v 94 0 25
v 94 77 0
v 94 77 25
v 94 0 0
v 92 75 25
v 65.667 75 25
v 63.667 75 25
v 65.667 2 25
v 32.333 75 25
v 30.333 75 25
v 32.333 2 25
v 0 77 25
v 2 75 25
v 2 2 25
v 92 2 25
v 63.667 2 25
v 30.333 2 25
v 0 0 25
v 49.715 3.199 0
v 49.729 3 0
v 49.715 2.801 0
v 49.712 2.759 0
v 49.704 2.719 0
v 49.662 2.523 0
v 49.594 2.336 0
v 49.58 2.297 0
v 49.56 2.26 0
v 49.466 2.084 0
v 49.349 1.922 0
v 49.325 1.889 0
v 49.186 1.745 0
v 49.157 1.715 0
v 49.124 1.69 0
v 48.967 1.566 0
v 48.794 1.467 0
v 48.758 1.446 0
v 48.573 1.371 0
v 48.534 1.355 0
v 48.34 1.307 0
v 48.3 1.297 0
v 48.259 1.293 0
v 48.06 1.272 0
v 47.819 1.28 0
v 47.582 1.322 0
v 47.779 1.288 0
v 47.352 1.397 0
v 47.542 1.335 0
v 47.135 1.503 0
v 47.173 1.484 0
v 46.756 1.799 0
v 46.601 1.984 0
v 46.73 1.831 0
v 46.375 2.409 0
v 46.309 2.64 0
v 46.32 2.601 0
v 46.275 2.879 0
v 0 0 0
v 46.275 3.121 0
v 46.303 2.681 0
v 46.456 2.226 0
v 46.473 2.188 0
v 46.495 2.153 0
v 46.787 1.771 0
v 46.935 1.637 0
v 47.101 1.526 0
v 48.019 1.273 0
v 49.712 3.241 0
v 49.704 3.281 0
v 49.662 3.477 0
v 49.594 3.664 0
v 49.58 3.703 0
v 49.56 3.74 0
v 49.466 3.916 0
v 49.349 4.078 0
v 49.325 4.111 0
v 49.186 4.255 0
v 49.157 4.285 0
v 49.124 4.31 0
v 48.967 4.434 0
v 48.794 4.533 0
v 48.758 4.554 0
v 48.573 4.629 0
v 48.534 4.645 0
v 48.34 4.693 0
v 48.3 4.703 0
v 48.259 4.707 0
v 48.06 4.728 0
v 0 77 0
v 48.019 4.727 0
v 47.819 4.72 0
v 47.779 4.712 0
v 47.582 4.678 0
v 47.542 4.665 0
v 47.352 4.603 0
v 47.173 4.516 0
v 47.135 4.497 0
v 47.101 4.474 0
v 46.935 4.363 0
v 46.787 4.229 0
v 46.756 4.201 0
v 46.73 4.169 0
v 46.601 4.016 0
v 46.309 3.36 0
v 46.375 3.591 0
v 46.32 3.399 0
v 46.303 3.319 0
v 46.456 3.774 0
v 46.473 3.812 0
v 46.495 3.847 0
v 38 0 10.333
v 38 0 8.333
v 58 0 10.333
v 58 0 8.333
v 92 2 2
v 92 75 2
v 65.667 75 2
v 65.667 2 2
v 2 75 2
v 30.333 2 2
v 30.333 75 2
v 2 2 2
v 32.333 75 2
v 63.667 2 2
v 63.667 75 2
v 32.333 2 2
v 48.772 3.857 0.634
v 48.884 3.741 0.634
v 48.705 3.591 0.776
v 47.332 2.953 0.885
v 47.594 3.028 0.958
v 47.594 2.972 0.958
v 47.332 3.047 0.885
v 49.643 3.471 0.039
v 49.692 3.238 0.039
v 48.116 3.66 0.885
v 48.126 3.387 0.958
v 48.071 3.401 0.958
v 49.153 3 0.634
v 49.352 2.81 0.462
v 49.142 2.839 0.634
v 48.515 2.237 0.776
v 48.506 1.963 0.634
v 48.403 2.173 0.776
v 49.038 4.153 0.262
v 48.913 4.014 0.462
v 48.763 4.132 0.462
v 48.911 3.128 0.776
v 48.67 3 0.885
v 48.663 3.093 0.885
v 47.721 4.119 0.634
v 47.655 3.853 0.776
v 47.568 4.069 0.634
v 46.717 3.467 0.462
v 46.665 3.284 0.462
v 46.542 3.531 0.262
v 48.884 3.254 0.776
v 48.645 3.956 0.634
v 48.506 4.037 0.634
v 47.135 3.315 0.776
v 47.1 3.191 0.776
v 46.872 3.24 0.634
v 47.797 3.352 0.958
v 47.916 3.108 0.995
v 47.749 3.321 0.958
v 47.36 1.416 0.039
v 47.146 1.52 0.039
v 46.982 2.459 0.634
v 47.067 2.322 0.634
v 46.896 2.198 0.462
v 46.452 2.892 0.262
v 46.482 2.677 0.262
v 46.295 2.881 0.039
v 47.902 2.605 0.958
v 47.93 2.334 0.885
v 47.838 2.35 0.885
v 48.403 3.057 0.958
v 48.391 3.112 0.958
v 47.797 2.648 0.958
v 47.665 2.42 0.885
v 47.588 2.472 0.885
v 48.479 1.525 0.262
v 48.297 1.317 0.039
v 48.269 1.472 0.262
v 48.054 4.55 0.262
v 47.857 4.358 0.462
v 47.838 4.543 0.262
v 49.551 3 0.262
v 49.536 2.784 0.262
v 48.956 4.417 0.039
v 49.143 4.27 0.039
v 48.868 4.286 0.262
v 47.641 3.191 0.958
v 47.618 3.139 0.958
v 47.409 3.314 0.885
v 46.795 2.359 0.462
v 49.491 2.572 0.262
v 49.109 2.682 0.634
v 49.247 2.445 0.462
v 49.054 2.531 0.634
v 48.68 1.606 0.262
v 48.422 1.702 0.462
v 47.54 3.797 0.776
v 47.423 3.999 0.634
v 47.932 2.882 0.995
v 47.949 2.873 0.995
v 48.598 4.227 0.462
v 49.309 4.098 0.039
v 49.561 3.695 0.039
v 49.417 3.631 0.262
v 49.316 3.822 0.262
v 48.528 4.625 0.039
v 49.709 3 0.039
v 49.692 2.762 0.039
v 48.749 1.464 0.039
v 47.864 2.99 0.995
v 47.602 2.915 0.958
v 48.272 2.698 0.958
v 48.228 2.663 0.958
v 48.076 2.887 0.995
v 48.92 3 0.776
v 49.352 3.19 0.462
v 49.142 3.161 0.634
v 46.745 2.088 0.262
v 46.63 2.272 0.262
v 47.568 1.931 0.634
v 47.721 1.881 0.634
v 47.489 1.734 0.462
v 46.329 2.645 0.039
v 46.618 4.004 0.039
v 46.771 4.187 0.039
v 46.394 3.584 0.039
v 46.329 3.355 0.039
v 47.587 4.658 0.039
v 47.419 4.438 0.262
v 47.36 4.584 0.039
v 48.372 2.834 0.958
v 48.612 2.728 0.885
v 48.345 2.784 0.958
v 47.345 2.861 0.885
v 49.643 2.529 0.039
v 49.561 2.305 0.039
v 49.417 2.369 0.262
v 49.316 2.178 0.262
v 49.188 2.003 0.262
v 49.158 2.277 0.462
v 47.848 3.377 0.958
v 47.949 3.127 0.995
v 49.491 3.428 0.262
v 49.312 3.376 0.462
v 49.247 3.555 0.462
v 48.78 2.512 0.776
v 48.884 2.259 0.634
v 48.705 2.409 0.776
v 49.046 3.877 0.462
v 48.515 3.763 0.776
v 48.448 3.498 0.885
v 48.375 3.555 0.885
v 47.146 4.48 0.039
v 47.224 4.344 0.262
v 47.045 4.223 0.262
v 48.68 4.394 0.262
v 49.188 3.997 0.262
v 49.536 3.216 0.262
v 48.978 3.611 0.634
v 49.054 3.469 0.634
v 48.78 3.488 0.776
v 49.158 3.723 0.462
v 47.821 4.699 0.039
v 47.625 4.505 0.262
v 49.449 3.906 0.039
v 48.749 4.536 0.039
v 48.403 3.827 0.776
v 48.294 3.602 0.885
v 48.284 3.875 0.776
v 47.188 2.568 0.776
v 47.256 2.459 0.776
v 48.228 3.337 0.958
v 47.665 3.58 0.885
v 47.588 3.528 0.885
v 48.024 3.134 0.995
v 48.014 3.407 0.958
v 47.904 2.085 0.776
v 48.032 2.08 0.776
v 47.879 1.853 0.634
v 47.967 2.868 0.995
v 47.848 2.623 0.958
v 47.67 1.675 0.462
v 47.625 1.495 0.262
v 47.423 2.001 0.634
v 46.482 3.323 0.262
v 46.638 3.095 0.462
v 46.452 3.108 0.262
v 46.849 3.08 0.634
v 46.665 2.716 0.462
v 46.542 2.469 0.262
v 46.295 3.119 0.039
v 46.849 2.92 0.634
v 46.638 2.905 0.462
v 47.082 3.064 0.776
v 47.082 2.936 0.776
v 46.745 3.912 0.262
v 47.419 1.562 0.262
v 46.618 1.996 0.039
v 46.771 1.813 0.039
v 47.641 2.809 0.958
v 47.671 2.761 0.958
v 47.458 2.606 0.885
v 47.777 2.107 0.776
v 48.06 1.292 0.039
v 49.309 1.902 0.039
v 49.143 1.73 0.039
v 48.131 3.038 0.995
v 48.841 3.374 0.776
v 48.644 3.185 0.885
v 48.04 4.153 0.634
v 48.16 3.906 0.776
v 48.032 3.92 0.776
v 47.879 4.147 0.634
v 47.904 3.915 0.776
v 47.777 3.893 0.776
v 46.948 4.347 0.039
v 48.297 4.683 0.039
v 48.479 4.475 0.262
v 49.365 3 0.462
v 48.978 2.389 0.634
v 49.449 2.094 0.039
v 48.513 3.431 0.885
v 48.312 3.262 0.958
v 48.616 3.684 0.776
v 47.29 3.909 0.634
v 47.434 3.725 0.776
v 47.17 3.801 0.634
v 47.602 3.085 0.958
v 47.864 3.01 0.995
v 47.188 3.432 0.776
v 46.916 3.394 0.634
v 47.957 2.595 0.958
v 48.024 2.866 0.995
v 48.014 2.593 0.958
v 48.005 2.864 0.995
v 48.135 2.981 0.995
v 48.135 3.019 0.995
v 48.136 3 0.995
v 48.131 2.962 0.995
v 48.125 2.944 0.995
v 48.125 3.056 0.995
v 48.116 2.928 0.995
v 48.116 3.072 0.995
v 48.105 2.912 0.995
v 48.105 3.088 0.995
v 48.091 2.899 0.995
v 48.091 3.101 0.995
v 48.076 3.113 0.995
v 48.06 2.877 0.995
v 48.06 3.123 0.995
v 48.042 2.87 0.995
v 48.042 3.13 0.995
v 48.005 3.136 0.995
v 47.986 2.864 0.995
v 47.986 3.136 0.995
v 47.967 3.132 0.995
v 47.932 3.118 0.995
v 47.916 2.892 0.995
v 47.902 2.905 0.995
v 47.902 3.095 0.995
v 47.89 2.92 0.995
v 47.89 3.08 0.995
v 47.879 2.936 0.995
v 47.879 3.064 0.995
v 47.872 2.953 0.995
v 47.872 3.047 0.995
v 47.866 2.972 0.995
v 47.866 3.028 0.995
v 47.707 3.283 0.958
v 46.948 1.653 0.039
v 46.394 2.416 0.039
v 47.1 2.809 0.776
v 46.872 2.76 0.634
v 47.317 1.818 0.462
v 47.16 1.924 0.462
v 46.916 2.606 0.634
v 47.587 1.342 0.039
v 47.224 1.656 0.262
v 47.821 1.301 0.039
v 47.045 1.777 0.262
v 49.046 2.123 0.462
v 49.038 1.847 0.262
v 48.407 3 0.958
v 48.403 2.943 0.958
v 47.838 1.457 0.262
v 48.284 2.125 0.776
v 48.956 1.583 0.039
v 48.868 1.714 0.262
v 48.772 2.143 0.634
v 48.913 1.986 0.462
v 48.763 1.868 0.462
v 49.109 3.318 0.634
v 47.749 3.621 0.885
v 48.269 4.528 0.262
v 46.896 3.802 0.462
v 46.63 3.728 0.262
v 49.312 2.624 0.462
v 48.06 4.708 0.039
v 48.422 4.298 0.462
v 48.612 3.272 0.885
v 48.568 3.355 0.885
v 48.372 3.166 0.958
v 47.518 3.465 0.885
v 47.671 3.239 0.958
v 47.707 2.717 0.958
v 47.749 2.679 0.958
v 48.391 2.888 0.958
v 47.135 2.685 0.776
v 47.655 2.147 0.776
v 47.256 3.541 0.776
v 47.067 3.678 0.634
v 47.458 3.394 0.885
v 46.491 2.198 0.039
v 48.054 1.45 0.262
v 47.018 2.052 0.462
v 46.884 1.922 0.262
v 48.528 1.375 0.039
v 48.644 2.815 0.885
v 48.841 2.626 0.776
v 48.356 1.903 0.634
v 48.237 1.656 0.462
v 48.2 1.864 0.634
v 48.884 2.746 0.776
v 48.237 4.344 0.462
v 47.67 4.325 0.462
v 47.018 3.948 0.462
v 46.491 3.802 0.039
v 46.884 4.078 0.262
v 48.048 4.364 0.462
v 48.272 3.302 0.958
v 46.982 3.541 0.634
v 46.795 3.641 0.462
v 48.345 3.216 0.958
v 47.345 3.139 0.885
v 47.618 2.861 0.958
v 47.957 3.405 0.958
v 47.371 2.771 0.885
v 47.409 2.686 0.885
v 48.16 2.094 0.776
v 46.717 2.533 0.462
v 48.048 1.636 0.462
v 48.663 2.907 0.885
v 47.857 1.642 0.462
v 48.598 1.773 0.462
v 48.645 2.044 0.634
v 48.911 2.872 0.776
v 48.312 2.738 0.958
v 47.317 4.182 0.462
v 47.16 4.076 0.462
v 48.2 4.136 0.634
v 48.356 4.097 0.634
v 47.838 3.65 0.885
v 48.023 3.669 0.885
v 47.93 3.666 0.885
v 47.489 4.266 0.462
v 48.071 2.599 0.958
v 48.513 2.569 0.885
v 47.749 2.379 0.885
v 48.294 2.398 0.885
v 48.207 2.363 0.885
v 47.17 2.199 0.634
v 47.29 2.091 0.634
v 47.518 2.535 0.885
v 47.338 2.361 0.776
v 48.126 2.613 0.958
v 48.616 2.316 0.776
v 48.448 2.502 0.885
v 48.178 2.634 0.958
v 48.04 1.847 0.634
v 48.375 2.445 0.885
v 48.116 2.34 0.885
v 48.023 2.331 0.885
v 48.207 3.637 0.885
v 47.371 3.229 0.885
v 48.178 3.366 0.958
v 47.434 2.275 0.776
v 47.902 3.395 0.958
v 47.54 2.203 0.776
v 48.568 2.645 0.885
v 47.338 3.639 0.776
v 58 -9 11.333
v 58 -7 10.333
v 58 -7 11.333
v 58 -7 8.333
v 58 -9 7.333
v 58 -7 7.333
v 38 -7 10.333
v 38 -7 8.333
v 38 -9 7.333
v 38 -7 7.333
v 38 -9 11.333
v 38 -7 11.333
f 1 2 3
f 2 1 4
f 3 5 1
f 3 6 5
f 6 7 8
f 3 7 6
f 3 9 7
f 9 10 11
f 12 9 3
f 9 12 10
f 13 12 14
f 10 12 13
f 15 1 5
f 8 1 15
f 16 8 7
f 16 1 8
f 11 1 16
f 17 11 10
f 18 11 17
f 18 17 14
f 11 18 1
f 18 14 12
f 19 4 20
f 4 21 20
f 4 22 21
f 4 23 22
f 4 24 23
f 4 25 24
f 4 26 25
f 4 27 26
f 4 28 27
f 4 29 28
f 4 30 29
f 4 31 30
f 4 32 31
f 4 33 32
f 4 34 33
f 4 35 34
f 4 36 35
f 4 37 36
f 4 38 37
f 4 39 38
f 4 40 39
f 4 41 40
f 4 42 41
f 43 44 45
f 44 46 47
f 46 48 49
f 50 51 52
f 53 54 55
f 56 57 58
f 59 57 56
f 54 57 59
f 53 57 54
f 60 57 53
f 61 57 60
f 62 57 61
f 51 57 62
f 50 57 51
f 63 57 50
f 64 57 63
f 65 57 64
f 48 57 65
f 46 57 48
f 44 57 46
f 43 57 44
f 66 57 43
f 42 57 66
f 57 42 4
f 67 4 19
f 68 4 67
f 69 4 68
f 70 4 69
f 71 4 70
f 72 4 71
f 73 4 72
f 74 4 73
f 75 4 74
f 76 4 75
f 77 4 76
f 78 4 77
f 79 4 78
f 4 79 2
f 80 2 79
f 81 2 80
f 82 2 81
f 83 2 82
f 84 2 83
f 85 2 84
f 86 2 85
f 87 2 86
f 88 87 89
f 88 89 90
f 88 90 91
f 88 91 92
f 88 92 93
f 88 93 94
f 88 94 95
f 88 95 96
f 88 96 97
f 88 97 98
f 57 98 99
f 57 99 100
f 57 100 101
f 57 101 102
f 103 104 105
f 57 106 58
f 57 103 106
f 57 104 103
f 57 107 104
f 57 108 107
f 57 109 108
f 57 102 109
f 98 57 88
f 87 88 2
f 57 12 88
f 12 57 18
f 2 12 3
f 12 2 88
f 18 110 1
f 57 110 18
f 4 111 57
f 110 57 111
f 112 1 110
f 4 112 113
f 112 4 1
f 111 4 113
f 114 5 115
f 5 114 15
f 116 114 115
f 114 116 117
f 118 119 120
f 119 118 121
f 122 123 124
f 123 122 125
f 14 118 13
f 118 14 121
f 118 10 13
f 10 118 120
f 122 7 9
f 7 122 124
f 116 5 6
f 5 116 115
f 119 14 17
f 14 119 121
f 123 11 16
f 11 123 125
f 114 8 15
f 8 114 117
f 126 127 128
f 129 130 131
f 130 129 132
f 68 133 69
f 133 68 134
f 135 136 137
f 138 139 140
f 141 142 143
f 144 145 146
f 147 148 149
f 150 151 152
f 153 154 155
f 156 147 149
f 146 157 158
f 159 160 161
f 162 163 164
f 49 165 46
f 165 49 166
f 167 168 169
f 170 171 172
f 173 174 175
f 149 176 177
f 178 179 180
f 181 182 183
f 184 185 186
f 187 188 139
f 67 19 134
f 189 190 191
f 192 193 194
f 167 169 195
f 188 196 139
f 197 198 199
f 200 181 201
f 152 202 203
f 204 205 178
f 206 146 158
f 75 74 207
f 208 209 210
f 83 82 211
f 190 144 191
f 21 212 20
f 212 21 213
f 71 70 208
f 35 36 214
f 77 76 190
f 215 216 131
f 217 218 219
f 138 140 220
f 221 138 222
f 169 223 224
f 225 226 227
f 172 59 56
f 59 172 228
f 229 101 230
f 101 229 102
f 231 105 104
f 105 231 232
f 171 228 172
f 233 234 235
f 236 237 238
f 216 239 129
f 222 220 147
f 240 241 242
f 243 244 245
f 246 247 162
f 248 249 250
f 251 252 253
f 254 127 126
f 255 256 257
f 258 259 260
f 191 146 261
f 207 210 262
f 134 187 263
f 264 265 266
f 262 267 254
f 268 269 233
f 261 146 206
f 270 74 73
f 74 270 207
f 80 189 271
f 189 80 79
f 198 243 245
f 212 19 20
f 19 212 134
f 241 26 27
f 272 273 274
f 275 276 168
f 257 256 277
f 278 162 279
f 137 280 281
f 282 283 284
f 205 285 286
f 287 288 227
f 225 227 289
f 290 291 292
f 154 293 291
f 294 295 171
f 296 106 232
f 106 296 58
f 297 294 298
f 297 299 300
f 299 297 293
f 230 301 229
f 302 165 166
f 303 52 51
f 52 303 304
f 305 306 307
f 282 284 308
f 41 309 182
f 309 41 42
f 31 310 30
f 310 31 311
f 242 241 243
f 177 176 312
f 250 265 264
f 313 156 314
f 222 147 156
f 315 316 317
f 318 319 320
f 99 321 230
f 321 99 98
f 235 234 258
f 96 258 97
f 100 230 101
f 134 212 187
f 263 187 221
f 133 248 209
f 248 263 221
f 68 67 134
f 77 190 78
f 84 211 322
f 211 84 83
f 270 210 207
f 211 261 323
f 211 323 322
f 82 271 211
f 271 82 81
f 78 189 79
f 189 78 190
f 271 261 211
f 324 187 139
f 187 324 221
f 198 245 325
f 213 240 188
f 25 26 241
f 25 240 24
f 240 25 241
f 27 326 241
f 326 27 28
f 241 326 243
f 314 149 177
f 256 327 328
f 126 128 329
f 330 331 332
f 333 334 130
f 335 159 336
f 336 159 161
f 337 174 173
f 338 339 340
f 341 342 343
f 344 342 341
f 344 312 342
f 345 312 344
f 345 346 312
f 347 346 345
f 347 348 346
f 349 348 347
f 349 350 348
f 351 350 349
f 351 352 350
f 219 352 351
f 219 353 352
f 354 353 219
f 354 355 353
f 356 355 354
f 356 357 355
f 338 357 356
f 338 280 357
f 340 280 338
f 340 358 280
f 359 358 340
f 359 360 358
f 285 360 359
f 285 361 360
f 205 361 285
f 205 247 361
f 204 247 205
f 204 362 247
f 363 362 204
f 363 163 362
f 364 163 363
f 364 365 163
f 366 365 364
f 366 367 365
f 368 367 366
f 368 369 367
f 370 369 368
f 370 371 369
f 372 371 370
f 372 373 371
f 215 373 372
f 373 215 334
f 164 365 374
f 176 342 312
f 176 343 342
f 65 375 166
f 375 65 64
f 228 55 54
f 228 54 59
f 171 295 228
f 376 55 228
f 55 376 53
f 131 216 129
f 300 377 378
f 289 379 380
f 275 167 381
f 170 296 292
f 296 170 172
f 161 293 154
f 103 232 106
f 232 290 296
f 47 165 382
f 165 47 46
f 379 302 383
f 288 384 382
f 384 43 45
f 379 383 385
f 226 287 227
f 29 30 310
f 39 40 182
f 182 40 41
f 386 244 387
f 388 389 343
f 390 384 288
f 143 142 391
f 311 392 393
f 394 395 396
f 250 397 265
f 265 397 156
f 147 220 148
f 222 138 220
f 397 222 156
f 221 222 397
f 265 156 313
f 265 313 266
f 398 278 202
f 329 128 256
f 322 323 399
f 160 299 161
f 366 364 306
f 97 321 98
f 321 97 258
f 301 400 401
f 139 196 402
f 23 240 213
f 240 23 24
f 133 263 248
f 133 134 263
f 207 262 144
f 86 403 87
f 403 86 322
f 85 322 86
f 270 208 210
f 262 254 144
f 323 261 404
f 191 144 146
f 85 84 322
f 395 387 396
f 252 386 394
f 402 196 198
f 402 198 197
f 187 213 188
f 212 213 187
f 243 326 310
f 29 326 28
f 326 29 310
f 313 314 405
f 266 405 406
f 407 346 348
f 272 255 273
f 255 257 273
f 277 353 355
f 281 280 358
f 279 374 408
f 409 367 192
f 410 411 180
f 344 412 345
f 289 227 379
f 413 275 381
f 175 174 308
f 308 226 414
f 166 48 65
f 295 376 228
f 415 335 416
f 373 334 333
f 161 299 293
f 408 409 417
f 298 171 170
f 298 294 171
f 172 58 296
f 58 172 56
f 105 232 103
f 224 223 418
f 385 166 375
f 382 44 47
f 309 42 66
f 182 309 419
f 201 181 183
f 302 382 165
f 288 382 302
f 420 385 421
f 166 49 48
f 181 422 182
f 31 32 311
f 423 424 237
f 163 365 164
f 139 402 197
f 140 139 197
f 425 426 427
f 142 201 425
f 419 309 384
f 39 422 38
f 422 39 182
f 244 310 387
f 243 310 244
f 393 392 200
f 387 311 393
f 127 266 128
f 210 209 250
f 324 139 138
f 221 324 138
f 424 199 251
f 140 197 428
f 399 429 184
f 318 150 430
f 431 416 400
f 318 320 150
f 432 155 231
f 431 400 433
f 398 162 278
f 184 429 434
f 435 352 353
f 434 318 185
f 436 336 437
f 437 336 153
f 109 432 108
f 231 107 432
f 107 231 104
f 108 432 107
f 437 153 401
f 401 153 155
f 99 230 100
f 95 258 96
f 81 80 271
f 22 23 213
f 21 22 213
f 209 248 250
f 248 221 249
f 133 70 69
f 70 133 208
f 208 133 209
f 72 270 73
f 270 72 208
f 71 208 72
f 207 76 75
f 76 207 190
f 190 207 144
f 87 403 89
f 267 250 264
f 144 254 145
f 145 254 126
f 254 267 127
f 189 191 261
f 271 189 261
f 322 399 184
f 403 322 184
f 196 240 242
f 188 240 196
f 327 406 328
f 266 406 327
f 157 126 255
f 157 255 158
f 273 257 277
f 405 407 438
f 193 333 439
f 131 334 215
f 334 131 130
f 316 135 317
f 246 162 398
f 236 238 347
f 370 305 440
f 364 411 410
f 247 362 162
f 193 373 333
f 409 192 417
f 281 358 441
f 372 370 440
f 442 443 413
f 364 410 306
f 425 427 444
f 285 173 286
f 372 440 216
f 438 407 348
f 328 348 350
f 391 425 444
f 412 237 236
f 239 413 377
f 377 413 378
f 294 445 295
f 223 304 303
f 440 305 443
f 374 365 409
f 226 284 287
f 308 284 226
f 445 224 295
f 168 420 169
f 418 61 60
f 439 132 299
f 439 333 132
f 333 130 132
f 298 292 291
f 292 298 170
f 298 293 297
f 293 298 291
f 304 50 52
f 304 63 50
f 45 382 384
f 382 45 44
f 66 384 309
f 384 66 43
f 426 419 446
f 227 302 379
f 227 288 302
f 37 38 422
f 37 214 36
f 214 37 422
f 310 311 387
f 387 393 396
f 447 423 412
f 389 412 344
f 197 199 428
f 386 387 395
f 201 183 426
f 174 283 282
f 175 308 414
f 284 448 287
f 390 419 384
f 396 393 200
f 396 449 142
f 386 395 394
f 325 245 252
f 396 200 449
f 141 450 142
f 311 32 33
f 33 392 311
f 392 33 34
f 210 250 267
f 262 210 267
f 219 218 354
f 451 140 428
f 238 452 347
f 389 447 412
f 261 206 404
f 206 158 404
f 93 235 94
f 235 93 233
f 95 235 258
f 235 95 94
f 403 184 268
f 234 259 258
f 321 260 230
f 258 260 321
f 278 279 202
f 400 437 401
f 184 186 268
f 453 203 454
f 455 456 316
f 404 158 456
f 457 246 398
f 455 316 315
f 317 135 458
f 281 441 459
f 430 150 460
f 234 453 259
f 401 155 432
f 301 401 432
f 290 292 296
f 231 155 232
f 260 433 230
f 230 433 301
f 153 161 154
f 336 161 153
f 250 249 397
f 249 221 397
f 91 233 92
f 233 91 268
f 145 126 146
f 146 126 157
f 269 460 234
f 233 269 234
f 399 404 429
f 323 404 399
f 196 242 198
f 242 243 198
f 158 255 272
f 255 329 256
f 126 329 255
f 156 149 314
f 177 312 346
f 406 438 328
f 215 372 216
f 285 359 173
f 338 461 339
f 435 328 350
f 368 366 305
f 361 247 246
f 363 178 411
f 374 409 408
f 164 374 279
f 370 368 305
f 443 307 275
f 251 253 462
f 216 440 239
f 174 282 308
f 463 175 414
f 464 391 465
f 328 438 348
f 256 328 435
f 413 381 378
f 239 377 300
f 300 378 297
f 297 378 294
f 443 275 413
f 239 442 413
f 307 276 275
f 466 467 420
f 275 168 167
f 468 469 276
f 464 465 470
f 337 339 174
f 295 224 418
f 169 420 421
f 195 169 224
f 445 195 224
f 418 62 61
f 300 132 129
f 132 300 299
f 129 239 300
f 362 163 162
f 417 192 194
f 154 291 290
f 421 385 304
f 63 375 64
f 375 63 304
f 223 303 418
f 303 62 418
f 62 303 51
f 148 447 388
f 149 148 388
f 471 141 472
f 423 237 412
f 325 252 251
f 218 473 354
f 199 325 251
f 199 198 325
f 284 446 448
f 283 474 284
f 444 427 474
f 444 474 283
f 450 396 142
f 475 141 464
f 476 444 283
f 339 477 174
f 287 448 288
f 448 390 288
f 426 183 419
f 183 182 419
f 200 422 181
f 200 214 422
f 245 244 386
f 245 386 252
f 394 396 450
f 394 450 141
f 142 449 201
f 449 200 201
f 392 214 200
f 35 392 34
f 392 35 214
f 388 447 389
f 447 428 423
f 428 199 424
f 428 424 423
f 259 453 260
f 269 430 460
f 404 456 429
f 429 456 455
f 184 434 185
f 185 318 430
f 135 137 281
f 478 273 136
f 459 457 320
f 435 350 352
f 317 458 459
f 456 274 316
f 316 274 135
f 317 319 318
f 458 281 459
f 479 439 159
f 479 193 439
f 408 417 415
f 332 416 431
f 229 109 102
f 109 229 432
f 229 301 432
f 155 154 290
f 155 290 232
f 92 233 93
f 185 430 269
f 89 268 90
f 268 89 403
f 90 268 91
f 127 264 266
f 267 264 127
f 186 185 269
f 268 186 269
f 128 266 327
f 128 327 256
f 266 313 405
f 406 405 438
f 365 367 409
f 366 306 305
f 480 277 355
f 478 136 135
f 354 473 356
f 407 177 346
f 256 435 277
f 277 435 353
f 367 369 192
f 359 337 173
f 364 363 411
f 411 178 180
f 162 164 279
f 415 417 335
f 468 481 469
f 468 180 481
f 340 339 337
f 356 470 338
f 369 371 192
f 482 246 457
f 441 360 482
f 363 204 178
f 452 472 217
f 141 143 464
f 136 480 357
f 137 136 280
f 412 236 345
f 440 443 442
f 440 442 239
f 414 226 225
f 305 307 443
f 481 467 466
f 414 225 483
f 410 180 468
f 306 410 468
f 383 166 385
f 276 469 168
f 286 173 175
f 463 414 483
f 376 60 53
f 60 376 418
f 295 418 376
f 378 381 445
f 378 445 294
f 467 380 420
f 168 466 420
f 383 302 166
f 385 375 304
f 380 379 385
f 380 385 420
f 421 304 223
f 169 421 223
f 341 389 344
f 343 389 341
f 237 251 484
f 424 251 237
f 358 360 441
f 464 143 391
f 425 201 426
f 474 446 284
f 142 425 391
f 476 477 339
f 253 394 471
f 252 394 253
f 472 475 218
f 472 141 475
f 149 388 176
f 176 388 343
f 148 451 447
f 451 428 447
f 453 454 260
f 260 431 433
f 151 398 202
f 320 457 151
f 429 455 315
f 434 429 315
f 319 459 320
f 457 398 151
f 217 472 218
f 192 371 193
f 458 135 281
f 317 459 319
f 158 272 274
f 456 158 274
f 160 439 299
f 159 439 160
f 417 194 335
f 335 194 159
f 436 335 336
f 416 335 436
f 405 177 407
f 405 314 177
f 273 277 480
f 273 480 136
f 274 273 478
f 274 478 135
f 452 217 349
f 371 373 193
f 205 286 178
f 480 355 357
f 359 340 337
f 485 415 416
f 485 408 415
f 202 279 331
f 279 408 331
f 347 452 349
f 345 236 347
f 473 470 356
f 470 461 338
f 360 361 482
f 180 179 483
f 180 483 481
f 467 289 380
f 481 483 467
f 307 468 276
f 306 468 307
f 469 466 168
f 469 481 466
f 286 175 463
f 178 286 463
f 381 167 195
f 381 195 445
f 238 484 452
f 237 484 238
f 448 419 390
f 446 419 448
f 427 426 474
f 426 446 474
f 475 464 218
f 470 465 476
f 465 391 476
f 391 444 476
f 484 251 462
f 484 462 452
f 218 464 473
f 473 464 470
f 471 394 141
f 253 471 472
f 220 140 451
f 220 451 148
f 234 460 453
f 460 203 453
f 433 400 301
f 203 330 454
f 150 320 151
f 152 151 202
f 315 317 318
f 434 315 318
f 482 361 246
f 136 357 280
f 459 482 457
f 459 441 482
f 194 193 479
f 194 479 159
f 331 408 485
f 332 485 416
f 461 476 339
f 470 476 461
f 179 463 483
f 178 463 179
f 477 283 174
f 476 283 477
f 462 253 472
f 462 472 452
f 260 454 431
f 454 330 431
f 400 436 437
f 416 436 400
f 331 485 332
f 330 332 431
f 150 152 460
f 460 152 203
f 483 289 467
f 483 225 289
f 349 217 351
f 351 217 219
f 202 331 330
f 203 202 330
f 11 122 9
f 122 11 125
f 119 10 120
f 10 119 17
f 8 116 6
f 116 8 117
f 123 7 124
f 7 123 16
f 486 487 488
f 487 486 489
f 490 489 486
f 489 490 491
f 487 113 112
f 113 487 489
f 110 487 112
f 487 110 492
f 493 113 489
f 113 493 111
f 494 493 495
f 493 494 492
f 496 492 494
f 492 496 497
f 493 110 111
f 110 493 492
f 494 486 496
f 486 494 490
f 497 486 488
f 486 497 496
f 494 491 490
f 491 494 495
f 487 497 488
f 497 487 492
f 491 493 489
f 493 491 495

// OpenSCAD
$fn = 45;

DRAWER_HEIGHT = 25;
CABINET_WIDTH = 100; // adjustable from ~30-200
CABINET_DEPTH = 80;  // adjustable from ~50-200

// drawer 1, 2 dividers
difference() {
    translate([0,0,0]) cube([CABINET_WIDTH - 6, CABINET_DEPTH - 3, DRAWER_HEIGHT]);
    translate([2,2,2]) cube([CABINET_WIDTH - 10, CABINET_DEPTH - 7, DRAWER_HEIGHT]);
    translate([(CABINET_WIDTH / 2) - 2, 3, -1]) sphere(2);
}

// dividers
    translate([(CABINET_WIDTH / 3) - 3,2,0]) cube([2, CABINET_DEPTH - 7, DRAWER_HEIGHT]);
    translate([(CABINET_WIDTH / 3) * 2 - 3,2,0]) cube([2, CABINET_DEPTH - 7, DRAWER_HEIGHT]);

// pull handle
translate([(CABINET_WIDTH / 2) - 12,-9,(DRAWER_HEIGHT / 3)]) cube([20, 10, 2]);
translate([(CABINET_WIDTH / 2) - 12,-9,(DRAWER_HEIGHT / 3) -1]) cube([20, 2, 4]);
